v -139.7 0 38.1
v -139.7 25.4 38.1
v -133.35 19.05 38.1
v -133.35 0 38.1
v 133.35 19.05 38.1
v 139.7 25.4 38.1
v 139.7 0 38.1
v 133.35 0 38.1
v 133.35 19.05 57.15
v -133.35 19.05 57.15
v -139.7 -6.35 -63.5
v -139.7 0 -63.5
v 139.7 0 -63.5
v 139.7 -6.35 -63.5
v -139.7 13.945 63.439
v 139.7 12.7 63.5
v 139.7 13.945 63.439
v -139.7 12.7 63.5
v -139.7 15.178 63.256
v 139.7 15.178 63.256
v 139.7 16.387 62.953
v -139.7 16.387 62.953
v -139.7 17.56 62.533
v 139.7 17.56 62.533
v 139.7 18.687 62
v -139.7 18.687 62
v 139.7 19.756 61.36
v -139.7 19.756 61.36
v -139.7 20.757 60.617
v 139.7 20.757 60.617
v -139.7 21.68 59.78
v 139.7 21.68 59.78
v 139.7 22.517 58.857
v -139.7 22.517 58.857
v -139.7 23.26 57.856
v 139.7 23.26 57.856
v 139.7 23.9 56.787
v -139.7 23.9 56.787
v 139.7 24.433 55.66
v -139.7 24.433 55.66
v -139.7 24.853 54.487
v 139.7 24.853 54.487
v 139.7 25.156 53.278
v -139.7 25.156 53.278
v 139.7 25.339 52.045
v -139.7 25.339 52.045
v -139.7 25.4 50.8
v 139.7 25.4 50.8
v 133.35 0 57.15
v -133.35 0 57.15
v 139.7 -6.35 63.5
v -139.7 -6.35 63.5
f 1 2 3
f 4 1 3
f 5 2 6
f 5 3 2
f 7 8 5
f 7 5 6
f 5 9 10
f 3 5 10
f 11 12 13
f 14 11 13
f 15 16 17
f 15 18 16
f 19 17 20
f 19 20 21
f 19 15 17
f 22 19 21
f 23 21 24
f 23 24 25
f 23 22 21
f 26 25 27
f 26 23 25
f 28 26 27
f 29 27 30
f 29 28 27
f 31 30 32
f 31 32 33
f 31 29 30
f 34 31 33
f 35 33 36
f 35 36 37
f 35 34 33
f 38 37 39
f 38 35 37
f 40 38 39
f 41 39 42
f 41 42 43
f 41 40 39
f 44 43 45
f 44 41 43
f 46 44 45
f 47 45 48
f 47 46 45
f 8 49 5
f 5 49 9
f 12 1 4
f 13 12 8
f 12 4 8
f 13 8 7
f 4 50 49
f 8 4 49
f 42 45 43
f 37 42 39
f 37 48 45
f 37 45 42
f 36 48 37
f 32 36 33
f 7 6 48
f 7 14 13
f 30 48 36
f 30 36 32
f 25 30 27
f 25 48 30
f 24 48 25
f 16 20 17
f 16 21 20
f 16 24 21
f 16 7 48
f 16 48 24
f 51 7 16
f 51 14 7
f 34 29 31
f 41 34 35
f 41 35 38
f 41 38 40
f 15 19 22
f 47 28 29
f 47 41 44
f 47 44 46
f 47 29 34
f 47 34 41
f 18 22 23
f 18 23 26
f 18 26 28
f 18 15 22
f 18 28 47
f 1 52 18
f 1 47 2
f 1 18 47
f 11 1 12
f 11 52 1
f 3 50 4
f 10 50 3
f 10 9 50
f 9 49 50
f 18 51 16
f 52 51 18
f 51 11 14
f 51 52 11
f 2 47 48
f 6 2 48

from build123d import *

# Parameters (mm, degrees)
F0_W     = 279.4
F0_H     = 101.6
F1_DEPTH = 6.35
F2_DEPTH = 25.4
F3_T     = -6.35
F4_R     = 12.7


# Not quite as in the source:
# - a shell that OpenCascade refuses in one call is made with other operations: the cavity is built on its own and cut out


with BuildPart() as f1:
    # F0 (on Front) → F1 (new body)
    with BuildSketch(Plane.XZ):
        with Locations((0, -12.7)):
            Rectangle(F0_W, F0_H)
        Polygon((-139.7, 38.1), (139.7, 38.1), (139.7, 50.8), (0, 50.8), (-139.7, 50.8), align=None)
        Polygon((0, 50.8), (139.7, 50.8), (139.7, 63.5), (-139.7, 63.5), (-139.7, 50.8), align=None)
    extrude(amount=F1_DEPTH)

    # F0 (on Front) → F2 (join)
    with BuildSketch(Plane.XZ):
        Polygon((0, 50.8), (139.7, 50.8), (139.7, 63.5), (-139.7, 63.5), (-139.7, 50.8), align=None)
        Polygon((-139.7, 38.1), (139.7, 38.1), (139.7, 50.8), (0, 50.8), (-139.7, 50.8), align=None)
    extrude(amount=-F2_DEPTH)

    # F3: a shell. OpenCascade refuses it in one call, so the cavity is built on its own and cut out:
    # the body offset inwards by the wall thickness, plus a prism from it out through each open face.
    f3_core = offset(f1.part, amount=F3_T, kind=Kind.INTERSECTION, mode=Mode.PRIVATE)
    f3_exits = [f3_core.faces().sort_by_distance(p)[0] for p in [
        (0, 9.525, 44.45),
    ]]
    add(f3_core, mode=Mode.SUBTRACT)
    extrude(f3_exits, amount=-F3_T, mode=Mode.SUBTRACT)

    # F4
    f4_edges = [f1.edges().sort_by_distance(p)[0] for p in [
        (0, 25.4, 63.5),
    ]]
    fillet(f4_edges, radius=F4_R)


solid = f1.part
